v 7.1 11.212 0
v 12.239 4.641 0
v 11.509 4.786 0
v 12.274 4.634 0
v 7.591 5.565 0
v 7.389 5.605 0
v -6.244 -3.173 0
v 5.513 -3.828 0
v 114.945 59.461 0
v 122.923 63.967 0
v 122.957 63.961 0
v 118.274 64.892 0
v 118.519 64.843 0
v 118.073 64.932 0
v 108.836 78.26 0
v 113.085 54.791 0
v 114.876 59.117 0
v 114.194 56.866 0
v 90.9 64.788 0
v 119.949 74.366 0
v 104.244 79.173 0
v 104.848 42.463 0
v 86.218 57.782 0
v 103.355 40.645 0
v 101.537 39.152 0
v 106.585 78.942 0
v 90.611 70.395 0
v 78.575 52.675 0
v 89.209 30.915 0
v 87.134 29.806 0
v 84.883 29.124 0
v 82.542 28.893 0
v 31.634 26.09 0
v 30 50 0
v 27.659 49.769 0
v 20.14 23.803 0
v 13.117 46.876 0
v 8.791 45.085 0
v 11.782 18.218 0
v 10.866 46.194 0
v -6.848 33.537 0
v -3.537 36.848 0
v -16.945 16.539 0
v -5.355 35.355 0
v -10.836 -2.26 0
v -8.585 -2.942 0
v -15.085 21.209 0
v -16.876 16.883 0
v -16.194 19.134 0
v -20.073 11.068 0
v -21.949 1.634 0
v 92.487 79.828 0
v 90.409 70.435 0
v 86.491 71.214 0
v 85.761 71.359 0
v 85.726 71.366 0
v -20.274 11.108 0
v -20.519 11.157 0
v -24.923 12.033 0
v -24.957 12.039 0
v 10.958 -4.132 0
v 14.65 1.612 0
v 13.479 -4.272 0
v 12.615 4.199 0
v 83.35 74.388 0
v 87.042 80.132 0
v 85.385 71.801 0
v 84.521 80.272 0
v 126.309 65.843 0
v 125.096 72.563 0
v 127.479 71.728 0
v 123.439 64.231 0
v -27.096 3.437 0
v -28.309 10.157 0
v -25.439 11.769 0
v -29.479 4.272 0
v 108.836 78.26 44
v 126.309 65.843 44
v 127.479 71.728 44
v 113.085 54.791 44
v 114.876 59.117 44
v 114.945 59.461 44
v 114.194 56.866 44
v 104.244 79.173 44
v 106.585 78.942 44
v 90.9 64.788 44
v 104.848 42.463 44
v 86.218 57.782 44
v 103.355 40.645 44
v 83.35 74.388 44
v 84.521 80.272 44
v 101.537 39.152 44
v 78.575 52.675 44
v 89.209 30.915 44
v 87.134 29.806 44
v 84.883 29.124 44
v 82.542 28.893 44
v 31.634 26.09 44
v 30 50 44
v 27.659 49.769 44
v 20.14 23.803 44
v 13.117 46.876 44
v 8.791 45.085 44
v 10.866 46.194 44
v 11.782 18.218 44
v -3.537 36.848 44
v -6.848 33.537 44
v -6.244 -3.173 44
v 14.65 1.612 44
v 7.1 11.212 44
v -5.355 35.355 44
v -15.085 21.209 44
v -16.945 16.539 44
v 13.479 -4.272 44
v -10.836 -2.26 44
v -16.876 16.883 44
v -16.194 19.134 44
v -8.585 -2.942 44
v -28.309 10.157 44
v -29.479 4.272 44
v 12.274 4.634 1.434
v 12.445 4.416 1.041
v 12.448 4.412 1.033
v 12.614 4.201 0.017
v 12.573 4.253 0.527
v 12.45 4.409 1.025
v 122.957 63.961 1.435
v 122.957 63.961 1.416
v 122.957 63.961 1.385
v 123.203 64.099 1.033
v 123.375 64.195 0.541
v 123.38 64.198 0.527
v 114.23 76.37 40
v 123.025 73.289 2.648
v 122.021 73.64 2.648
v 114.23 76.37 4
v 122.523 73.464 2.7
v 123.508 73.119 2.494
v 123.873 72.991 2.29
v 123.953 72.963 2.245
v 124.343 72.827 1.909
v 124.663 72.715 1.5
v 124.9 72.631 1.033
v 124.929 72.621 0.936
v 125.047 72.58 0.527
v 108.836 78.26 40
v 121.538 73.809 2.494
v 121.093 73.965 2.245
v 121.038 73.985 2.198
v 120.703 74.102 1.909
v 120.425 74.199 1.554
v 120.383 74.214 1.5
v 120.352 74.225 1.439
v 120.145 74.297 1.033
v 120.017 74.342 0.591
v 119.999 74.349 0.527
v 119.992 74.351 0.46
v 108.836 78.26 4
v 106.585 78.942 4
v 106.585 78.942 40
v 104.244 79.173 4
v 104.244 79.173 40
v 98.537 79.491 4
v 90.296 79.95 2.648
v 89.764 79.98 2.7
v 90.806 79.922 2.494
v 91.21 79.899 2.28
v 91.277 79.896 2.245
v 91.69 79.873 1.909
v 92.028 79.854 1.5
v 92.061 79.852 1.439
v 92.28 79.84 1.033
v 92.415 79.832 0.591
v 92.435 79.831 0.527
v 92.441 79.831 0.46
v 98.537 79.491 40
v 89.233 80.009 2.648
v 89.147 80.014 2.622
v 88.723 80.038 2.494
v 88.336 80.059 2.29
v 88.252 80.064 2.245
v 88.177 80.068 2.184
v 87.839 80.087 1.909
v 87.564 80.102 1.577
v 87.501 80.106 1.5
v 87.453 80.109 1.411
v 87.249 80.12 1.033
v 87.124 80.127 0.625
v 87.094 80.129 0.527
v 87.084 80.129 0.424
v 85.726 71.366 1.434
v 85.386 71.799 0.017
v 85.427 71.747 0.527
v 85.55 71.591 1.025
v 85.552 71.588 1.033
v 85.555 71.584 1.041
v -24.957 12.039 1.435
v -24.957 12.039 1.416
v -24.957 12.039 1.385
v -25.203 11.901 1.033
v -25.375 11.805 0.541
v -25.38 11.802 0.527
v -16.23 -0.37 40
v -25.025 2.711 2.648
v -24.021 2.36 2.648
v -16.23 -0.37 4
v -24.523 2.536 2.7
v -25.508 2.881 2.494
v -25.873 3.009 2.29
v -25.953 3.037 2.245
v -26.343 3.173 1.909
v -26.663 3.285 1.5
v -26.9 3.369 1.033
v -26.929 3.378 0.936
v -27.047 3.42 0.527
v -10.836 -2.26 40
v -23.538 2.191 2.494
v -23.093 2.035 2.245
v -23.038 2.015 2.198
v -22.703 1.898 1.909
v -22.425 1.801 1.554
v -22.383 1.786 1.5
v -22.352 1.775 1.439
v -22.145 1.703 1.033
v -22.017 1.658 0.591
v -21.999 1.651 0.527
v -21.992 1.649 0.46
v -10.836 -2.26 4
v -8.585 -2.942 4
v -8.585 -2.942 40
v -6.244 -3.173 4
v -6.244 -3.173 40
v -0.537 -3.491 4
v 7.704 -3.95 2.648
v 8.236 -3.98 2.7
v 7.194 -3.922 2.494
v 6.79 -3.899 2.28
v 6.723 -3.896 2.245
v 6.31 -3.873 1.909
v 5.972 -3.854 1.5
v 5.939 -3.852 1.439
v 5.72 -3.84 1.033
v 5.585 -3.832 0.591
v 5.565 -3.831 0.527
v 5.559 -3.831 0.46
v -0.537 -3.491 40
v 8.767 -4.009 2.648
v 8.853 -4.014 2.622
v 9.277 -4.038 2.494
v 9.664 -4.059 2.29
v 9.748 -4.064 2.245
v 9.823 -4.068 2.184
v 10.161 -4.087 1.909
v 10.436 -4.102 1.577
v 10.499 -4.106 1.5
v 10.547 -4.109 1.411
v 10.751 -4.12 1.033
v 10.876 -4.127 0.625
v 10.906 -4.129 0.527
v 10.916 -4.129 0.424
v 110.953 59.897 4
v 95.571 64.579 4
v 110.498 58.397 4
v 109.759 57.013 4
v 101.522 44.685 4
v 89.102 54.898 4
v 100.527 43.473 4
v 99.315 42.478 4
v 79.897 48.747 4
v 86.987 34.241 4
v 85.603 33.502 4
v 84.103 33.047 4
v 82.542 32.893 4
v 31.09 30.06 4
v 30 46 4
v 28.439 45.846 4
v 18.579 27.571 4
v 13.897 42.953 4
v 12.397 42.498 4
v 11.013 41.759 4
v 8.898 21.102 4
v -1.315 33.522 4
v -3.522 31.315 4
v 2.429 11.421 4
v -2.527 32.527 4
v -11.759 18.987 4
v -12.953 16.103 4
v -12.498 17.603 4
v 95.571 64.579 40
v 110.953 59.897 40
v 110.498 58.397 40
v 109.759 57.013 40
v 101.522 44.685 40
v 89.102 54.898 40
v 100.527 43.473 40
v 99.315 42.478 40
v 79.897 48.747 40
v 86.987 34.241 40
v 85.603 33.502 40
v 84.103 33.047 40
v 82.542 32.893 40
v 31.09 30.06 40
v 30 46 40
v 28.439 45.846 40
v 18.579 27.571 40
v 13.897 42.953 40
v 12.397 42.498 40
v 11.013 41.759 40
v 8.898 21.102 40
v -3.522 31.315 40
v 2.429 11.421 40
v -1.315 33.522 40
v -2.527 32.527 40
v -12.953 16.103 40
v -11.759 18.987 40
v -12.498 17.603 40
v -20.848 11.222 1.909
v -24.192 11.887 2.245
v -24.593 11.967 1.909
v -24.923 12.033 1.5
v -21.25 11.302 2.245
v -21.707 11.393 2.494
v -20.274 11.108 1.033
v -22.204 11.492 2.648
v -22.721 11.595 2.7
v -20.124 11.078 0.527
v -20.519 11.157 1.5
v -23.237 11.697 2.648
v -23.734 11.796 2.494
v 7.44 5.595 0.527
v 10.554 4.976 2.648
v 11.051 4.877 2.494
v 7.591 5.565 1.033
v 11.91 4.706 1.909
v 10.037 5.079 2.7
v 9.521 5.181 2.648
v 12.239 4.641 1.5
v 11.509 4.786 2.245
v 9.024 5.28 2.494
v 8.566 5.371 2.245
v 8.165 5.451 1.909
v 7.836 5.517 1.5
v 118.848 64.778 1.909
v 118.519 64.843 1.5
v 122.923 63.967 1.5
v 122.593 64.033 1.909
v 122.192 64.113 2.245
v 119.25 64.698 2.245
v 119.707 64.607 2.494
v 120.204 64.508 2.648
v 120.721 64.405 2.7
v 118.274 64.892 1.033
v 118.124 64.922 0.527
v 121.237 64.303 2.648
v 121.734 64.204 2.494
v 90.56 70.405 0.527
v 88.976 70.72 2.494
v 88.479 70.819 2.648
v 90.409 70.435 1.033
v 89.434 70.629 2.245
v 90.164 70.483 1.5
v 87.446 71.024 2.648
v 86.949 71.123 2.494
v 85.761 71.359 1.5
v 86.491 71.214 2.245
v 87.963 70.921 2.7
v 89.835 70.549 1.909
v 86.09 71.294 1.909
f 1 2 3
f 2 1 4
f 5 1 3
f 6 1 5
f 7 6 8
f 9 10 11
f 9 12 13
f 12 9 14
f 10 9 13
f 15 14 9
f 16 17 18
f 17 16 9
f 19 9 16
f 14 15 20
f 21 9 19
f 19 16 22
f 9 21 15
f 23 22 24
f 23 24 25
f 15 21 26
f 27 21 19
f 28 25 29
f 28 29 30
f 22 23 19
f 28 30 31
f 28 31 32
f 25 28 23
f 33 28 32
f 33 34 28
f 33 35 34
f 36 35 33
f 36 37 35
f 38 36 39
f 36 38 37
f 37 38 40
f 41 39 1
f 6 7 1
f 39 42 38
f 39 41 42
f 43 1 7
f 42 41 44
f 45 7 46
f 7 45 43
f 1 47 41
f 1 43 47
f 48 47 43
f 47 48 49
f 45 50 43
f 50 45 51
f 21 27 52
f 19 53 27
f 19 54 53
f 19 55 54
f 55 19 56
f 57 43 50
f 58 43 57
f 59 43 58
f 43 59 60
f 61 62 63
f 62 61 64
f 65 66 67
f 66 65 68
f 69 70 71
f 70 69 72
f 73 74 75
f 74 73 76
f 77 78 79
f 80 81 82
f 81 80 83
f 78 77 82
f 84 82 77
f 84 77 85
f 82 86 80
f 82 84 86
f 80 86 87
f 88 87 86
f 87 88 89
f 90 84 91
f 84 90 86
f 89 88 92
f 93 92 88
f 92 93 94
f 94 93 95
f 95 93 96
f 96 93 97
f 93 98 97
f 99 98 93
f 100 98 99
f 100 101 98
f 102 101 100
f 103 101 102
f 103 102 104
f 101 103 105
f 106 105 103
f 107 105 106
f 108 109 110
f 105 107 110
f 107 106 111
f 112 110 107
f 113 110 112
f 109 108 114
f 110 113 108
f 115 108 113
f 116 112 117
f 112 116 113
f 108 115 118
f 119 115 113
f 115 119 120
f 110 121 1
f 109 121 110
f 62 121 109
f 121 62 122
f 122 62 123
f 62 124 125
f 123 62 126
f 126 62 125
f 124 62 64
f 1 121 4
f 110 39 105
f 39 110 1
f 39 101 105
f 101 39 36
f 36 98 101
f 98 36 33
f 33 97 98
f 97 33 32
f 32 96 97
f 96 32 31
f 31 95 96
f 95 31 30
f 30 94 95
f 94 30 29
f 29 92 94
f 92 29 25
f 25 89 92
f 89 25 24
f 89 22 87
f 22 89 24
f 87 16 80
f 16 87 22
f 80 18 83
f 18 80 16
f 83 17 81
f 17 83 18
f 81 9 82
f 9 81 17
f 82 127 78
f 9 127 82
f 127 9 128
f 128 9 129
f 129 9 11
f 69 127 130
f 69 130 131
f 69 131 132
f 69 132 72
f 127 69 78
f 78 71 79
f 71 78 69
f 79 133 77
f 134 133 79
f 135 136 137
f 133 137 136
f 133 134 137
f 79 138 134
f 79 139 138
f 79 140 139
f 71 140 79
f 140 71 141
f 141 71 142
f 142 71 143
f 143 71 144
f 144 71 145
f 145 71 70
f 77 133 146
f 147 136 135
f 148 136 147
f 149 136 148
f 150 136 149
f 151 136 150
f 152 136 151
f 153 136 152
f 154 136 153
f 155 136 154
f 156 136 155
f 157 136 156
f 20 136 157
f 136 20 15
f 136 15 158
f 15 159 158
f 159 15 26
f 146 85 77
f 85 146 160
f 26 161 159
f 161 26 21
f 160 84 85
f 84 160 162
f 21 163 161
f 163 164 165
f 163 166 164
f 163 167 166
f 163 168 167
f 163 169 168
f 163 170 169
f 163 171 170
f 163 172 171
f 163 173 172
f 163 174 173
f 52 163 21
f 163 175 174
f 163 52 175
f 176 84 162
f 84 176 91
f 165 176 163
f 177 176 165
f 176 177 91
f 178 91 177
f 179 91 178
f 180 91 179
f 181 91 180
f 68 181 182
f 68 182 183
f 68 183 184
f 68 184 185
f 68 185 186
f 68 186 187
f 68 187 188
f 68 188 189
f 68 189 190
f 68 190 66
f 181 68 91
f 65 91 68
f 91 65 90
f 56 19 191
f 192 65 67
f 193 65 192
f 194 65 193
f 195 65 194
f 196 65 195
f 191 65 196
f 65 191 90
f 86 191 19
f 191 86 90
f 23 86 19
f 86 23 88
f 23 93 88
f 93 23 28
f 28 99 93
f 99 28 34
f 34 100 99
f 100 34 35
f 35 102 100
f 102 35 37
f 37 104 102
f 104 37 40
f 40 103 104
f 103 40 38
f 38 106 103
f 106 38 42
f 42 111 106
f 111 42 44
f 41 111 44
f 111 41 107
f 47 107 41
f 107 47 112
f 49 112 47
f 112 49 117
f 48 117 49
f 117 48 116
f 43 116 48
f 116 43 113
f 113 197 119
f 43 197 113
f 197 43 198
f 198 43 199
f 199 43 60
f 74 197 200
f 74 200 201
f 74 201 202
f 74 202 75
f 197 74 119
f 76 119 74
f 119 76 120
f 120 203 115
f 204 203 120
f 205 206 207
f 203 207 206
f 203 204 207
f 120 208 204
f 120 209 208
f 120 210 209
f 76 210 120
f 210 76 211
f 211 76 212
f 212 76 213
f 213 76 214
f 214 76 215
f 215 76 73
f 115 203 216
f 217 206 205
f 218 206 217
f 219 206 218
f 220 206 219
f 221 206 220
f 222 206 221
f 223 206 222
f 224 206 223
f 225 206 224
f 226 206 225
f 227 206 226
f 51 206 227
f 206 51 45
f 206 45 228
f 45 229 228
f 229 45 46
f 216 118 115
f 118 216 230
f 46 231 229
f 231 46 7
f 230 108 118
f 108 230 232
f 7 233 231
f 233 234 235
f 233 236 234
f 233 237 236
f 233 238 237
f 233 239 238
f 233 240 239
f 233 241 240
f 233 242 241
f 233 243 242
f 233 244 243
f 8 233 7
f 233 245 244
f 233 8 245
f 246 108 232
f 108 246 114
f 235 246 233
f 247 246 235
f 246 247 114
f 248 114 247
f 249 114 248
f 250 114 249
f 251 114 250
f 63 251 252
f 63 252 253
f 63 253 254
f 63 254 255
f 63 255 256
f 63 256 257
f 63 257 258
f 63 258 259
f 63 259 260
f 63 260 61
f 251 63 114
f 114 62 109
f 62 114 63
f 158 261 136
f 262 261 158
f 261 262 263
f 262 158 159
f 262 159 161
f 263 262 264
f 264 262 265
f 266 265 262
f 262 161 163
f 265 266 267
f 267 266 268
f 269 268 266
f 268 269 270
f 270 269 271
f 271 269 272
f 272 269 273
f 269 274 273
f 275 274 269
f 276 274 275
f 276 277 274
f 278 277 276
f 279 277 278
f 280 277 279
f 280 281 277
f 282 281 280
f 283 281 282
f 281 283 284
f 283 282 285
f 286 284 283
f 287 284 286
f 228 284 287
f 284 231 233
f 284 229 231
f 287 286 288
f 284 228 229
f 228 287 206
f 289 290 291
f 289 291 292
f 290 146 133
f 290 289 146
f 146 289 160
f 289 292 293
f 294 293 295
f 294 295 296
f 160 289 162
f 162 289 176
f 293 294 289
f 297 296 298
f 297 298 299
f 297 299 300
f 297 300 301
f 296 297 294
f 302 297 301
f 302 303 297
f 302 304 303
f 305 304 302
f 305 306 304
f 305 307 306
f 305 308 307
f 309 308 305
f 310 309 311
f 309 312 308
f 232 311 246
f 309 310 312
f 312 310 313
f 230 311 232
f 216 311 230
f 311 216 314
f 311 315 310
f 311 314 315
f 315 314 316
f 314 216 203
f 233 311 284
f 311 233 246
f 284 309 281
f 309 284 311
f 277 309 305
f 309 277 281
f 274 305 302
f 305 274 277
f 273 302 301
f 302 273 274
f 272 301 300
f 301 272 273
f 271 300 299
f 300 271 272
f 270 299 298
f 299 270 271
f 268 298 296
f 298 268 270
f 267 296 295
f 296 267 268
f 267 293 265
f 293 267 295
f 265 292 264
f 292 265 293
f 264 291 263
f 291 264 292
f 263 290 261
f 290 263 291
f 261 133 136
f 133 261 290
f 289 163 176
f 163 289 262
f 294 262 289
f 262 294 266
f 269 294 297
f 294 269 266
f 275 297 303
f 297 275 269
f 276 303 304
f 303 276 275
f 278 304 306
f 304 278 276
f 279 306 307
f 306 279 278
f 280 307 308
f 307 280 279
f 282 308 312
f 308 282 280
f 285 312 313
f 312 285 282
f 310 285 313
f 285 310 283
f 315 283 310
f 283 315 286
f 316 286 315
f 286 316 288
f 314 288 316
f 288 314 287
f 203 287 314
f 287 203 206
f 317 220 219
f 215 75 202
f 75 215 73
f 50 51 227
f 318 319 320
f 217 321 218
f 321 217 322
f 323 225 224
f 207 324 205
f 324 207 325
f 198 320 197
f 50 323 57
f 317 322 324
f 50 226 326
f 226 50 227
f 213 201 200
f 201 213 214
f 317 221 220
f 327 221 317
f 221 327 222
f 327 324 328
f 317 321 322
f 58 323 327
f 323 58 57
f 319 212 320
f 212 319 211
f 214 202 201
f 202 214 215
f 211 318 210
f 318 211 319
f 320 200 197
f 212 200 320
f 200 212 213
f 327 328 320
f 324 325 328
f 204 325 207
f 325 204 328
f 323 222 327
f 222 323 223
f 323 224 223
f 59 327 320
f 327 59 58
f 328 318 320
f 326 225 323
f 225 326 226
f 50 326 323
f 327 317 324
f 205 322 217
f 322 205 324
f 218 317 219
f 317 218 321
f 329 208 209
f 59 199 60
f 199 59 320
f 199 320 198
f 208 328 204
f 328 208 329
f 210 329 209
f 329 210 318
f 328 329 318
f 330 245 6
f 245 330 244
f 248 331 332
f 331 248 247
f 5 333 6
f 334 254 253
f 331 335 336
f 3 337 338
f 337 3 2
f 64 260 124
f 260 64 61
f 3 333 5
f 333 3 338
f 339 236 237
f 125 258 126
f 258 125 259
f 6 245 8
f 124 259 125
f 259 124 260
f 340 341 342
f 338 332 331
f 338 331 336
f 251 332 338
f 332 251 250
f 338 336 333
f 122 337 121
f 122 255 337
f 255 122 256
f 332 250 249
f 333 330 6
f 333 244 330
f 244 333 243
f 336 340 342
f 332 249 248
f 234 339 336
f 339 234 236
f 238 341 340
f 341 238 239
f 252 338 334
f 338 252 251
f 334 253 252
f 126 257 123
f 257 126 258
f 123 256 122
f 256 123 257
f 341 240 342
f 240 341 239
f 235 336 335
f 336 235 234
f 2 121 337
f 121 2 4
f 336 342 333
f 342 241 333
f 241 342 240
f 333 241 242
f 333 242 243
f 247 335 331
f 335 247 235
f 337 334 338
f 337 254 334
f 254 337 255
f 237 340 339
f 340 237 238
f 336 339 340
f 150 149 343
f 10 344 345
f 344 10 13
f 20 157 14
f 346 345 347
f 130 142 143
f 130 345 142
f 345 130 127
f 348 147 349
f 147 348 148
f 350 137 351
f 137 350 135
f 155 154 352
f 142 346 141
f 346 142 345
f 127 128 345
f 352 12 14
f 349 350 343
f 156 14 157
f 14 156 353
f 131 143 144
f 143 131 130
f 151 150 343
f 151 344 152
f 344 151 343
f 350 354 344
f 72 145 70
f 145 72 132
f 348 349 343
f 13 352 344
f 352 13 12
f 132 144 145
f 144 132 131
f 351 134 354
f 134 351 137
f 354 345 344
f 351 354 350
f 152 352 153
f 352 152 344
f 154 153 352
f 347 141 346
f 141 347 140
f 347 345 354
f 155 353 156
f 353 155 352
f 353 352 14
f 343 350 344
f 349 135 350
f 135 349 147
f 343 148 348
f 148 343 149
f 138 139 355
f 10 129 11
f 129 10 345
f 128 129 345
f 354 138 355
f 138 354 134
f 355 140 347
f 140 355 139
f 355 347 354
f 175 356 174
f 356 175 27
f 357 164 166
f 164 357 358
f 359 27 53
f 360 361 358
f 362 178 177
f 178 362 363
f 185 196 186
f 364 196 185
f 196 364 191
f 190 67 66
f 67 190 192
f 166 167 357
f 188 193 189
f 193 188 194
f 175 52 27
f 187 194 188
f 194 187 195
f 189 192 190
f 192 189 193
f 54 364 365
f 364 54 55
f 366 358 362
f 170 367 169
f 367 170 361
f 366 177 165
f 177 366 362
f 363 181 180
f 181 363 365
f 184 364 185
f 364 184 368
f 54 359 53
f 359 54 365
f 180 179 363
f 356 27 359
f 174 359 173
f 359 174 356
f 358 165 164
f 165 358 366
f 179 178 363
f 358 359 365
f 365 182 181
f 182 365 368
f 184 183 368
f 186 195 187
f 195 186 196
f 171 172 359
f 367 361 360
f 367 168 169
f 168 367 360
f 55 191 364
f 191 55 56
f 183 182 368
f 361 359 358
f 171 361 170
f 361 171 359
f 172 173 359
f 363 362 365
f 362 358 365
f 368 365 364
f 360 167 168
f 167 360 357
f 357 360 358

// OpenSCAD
$fn = 32;

// ----------------------------------------------------------------------
// Air duct: 24 mm duct, 4 mm wall, 44 mm across
// ----------------------------------------------------------------------

// --- parameters (mm) ---
duct_r = 12;              // duct core radius
duct_d = 24;              // duct core diameter
wall = 4;                 // duct wall thickness
height = 44;              // duct width (extrusion height)
port_r = 21.9;            // port flange half width
port_d = 43.8;            // port flange width
port_t = 6;               // port flange thickness
bolt_d = 5.4;             // port bolt holes
bolt_offset = 16.7;       // bolt hole offset from the port axis

difference() {
  /* outer hull chain: tube with a flat flange plate at every port */
  linear_extrude(height = 44) {
    hull() {
      polygon([[13.479, -4.272], [-29.479, 4.272], [-28.309, 10.157], [14.65, 1.612]]);
      translate([-6.244, 8.827]) circle(r = 12);
    }
    hull() {
      translate([-6.244, 8.827]) circle(r = 12);
      translate([-5.107, 14.542]) circle(r = 12);
    }
    hull() {
      translate([-5.107, 14.542]) circle(r = 12);
      translate([3.13, 26.87]) circle(r = 12);
    }
    hull() {
      translate([3.13, 26.87]) circle(r = 12);
      translate([15.458, 35.107]) circle(r = 12);
    }
    hull() {
      translate([15.458, 35.107]) circle(r = 12);
      translate([30, 38]) circle(r = 12);
    }
    hull() {
      translate([30, 38]) circle(r = 12);
      translate([82.542, 40.893]) circle(r = 12);
    }
    hull() {
      translate([82.542, 40.893]) circle(r = 12);
      translate([94.87, 49.13]) circle(r = 12);
    }
    hull() {
      translate([94.87, 49.13]) circle(r = 12);
      translate([103.107, 61.458]) circle(r = 12);
    }
    hull() {
      translate([103.107, 61.458]) circle(r = 12);
      translate([104.244, 67.173]) circle(r = 12);
    }
    hull() {
      translate([104.244, 67.173]) circle(r = 12);
      polygon([[84.521, 80.272], [127.479, 71.728], [126.309, 65.843], [83.35, 74.388]]);
    }
  }
  /* air passage: the same chain inset by the wall, 5 mm proud of the ports */
  translate([0, 0, 4]) linear_extrude(height = 36) {
    hull() {
      translate([-8.975, -4.904]) circle(r = 8);
      translate([-5.107, 14.542]) circle(r = 8);
    }
    hull() {
      translate([-5.107, 14.542]) circle(r = 8);
      translate([3.13, 26.87]) circle(r = 8);
    }
    hull() {
      translate([3.13, 26.87]) circle(r = 8);
      translate([15.458, 35.107]) circle(r = 8);
    }
    hull() {
      translate([15.458, 35.107]) circle(r = 8);
      translate([30, 38]) circle(r = 8);
    }
    hull() {
      translate([30, 38]) circle(r = 8);
      translate([82.542, 40.893]) circle(r = 8);
    }
    hull() {
      translate([82.542, 40.893]) circle(r = 8);
      translate([94.87, 49.13]) circle(r = 8);
    }
    hull() {
      translate([94.87, 49.13]) circle(r = 8);
      translate([103.107, 61.458]) circle(r = 8);
    }
    hull() {
      translate([103.107, 61.458]) circle(r = 8);
      translate([106.975, 80.904]) circle(r = 8);
    }
  }
  translate([-8, 0]) rotate([0, 0, -11.25]) translate([-16.7, -2.5]) rotate([-90, 0, 0]) cylinder(h = 11, d = 5.4);
  translate([-8, 0]) rotate([0, 0, -11.25]) translate([16.7, -2.5]) rotate([-90, 0, 0]) cylinder(h = 11, d = 5.4);
  translate([106, 76]) rotate([0, 0, 168.75]) translate([-16.7, -2.5]) rotate([-90, 0, 0]) cylinder(h = 11, d = 5.4);
  translate([106, 76]) rotate([0, 0, 168.75]) translate([16.7, -2.5]) rotate([-90, 0, 0]) cylinder(h = 11, d = 5.4);
}
